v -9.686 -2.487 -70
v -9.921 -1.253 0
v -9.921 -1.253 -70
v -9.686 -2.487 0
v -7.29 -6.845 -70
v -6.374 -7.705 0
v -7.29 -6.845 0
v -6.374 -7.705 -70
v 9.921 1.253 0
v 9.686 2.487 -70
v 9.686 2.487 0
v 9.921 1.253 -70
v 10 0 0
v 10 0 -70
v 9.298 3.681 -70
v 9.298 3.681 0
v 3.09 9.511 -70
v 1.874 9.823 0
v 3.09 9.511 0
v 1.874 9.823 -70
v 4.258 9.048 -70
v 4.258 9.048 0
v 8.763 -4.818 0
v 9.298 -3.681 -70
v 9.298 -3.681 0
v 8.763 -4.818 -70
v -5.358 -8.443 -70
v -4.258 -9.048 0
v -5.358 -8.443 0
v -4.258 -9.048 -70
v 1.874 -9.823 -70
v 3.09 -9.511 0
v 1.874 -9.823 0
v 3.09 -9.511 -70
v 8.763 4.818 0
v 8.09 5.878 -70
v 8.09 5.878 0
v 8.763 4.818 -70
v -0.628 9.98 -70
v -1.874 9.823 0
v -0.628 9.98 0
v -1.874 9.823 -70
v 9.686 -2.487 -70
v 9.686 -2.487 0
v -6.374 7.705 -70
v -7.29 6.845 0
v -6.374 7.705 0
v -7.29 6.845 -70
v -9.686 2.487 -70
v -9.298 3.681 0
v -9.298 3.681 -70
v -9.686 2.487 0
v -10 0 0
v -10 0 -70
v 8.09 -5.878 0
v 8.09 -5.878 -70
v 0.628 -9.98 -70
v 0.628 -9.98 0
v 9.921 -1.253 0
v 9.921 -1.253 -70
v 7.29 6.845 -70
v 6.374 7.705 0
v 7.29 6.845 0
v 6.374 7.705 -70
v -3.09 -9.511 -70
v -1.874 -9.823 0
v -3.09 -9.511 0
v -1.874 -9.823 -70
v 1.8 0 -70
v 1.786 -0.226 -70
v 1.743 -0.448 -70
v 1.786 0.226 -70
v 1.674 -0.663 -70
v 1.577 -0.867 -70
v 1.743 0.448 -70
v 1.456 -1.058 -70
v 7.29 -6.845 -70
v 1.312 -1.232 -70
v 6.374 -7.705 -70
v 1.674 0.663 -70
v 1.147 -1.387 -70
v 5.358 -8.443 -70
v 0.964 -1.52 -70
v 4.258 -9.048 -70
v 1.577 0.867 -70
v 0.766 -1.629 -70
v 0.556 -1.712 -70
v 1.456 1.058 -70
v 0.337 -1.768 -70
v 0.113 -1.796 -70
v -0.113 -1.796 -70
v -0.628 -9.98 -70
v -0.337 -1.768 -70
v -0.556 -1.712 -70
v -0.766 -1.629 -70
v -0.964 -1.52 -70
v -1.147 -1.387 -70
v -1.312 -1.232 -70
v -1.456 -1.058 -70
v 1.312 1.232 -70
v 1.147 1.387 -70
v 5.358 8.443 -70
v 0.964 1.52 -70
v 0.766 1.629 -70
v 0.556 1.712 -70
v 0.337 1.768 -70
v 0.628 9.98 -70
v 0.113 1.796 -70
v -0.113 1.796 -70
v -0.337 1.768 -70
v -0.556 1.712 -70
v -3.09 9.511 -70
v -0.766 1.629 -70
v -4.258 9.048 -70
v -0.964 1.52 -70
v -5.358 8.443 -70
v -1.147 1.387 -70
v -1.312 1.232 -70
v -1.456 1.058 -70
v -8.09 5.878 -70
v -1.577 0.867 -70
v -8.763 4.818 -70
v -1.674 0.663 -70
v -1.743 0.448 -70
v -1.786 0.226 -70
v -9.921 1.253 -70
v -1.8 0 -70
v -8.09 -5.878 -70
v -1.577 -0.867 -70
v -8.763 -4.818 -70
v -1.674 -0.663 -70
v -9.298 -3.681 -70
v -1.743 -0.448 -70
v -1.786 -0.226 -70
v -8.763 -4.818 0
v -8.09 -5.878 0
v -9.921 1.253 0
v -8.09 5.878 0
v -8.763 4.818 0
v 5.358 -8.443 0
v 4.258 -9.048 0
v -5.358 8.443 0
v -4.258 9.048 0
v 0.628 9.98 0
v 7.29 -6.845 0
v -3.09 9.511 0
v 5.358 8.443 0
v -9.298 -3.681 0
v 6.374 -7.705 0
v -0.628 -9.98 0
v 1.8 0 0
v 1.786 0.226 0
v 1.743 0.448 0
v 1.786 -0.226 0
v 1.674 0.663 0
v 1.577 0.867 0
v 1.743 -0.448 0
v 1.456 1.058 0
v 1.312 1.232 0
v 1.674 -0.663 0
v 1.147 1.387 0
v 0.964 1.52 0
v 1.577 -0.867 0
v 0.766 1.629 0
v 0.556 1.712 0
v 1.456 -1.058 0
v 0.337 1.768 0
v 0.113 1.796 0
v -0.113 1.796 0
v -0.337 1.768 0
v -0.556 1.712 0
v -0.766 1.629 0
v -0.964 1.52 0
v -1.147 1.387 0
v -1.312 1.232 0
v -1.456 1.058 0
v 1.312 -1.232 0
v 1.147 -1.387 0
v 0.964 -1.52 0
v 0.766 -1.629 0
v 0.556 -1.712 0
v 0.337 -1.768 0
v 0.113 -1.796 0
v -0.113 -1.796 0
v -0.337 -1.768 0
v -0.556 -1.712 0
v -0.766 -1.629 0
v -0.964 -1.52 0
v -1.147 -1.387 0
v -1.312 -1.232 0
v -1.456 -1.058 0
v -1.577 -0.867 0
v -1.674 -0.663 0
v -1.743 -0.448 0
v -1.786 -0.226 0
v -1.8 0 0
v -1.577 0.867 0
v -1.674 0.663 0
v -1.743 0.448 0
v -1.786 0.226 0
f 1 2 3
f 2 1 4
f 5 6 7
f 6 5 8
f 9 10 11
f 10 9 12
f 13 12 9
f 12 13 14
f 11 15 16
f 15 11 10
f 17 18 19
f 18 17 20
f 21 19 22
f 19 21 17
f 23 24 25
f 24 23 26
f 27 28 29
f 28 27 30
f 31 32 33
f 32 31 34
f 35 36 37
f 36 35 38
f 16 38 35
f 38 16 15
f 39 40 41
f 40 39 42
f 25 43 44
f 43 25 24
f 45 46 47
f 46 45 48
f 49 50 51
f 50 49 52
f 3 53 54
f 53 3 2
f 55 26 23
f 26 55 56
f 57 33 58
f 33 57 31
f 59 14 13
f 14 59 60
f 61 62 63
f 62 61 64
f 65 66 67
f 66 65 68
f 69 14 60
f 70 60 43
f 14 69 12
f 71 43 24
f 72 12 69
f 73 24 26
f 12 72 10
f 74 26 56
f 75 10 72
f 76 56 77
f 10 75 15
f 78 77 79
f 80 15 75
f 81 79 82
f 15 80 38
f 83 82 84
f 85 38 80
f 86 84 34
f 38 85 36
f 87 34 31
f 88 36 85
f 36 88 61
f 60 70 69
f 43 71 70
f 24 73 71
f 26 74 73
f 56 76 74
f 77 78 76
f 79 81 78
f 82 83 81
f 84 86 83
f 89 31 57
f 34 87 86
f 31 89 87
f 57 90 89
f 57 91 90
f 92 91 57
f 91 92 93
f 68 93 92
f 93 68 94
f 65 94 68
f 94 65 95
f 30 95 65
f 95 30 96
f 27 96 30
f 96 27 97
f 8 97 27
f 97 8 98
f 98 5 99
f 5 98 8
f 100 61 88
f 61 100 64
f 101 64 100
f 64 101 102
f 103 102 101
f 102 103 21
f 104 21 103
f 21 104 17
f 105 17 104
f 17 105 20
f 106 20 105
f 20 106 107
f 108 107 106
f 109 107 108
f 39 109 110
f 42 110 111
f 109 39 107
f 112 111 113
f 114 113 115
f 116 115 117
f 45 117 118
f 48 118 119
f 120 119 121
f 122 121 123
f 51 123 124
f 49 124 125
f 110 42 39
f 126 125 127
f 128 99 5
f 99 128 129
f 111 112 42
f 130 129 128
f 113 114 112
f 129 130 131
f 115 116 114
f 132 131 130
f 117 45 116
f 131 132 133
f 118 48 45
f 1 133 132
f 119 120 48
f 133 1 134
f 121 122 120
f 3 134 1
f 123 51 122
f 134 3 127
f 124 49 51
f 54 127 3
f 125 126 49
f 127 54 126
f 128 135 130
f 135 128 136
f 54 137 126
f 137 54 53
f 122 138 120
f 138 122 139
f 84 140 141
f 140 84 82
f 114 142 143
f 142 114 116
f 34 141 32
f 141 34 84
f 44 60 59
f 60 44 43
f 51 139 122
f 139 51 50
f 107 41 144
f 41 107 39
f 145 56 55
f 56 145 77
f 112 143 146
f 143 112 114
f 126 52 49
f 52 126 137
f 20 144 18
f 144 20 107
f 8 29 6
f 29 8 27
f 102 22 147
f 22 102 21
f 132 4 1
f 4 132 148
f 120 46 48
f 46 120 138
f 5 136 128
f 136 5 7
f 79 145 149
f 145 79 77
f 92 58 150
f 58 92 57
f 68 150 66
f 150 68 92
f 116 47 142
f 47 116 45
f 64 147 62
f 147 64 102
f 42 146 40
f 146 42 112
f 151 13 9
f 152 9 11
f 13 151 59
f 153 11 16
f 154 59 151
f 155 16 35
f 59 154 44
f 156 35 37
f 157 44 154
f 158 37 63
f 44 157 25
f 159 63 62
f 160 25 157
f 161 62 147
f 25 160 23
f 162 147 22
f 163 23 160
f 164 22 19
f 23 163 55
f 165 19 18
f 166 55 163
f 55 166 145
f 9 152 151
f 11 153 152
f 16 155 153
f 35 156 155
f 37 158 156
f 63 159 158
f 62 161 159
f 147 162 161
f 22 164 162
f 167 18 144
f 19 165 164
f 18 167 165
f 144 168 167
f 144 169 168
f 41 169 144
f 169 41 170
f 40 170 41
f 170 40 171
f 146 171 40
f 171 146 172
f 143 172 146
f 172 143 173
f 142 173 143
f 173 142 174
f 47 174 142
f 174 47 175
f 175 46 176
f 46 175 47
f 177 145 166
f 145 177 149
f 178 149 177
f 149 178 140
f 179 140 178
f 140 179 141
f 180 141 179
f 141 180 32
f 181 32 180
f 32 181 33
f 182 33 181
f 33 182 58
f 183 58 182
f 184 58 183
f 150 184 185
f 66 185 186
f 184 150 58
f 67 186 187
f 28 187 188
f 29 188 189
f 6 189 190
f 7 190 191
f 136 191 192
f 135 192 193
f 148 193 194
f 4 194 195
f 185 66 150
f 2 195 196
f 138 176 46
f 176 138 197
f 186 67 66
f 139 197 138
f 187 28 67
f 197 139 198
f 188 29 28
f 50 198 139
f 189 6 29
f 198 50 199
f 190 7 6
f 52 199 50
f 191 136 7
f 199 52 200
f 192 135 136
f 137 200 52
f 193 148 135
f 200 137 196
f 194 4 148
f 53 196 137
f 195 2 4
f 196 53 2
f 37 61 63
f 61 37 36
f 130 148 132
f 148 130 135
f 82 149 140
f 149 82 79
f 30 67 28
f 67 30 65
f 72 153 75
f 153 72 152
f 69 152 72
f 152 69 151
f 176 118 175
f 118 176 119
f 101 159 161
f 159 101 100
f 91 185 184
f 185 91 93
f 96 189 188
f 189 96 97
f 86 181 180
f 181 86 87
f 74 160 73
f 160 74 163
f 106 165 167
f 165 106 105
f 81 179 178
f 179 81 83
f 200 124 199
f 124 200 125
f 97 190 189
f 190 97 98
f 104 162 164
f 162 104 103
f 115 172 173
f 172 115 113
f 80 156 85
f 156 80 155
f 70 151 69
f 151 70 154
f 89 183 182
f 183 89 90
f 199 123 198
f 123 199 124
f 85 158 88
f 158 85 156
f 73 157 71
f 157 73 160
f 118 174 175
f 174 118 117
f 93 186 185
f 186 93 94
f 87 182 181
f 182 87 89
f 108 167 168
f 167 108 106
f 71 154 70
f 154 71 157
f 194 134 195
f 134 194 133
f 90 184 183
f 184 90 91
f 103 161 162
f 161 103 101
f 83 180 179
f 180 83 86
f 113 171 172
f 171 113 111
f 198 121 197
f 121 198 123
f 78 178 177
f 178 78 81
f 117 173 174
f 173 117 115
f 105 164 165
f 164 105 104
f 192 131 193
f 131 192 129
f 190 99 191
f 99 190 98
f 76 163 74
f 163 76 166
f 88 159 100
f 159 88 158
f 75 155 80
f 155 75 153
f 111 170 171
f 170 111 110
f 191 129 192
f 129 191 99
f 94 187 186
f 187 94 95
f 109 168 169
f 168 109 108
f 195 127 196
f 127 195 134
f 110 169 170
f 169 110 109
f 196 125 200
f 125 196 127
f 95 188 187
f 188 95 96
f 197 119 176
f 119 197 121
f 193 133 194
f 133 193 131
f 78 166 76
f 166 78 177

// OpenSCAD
$fn = 50;


difference() {
	union() {
		translate(v = [0, 0, -70.0000000000]) {
			cylinder(h = 70, r = 10.0000000000);
		}
		cylinder(h = 0, r = 13.0000000000);
	}
	union() {
		#translate(v = [0, 0, -70]) {
			cylinder(h = 70, r = 1.8000000000);
		}
	}
}
